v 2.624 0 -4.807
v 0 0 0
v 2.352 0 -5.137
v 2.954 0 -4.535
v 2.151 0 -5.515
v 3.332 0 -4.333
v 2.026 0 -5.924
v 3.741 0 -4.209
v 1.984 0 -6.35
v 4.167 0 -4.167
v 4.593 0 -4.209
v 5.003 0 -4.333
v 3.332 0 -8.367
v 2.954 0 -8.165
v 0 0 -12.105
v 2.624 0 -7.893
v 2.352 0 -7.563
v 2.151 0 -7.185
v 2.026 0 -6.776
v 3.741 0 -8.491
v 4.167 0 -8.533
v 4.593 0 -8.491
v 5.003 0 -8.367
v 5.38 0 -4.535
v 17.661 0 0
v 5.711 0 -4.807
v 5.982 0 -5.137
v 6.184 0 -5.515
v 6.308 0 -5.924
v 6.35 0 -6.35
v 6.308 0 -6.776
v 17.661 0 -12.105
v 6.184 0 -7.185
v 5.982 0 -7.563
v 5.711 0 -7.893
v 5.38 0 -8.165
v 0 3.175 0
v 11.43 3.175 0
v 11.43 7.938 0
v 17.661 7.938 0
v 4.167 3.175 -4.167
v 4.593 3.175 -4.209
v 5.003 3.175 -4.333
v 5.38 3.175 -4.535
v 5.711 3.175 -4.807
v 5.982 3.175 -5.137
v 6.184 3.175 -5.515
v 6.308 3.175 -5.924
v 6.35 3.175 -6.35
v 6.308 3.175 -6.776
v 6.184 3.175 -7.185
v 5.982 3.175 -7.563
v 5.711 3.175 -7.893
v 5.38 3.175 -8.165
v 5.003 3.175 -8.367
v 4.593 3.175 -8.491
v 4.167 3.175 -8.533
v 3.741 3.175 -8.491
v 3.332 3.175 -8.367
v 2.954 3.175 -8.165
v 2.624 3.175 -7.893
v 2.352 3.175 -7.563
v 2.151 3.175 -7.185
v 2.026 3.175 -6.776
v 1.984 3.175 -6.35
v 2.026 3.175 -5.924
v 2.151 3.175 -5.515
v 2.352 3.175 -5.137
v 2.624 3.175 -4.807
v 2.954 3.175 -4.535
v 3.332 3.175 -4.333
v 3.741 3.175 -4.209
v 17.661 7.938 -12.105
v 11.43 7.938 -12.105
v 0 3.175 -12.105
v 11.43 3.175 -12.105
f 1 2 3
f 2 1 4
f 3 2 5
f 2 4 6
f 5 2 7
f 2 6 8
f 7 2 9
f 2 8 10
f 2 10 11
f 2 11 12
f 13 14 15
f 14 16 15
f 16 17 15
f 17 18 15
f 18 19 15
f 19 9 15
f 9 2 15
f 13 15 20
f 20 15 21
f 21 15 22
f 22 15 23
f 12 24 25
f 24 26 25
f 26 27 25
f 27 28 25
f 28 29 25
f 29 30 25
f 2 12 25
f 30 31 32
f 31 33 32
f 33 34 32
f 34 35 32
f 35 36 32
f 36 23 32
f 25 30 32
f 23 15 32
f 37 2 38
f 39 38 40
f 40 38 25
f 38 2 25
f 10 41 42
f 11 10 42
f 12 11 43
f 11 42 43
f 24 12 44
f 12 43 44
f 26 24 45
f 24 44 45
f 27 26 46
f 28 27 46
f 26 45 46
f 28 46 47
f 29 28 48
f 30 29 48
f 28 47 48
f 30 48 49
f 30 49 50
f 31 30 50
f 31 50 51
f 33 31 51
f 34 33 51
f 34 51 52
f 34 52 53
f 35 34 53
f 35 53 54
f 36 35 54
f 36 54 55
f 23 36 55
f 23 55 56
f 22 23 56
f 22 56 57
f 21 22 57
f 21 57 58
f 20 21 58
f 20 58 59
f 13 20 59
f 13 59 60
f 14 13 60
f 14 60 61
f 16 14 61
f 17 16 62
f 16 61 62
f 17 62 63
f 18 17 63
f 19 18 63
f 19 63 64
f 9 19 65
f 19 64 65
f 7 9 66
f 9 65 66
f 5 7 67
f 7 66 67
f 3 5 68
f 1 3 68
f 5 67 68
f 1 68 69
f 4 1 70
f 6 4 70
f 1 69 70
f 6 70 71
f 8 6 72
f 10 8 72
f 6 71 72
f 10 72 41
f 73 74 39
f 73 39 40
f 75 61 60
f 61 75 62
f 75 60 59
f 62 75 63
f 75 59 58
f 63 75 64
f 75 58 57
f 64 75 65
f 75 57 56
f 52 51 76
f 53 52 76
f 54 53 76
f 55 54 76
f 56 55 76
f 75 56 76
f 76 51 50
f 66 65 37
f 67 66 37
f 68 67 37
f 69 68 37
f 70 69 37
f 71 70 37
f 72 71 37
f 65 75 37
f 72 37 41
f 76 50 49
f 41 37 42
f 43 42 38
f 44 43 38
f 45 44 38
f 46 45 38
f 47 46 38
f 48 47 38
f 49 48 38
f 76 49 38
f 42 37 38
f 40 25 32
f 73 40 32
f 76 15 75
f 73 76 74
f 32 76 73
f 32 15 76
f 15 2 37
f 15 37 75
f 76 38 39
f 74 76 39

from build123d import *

# Parameters (mm, degrees)
SKETCH1_W           = 17.6609375
SKETCH1_H           = 12.1046875
BOSS_EXTRUDE1_DEPTH = 7.9375
SKETCH2_W           = 11.43
SKETCH2_H           = 4.7625
CUT_EXTRUDE1_DEPTH  = 25.4
SKETCH3_R           = 2.1828125
CUT_EXTRUDE2_DEPTH  = 25.4


with BuildPart() as part:
    # Sketch1 → Boss-Extrude1 (new body)
    with BuildSketch(Plane(origin=(0, 0, 0), x_dir=(1, 0, 0), z_dir=(0, 1, 0))):
        with Locations((8.83046875, 6.05234375)):
            Rectangle(SKETCH1_W, SKETCH1_H)
    extrude(amount=BOSS_EXTRUDE1_DEPTH)

    # Sketch2 → Cut-Extrude1 (cut)
    with BuildSketch(Plane.XY):
        with Locations((5.715, 5.55625)):
            Rectangle(SKETCH2_W, SKETCH2_H)
    extrude(amount=-CUT_EXTRUDE1_DEPTH, mode=Mode.SUBTRACT)

    # Sketch3 → Cut-Extrude2 (cut)
    with BuildSketch(Plane(origin=(0, 3.175, 0), x_dir=(1, 0, 0), z_dir=(0, 1, 0))):
        with Locations(Location((4.1671875, 6.35, 0), (0, 0, 270))):
            Circle(SKETCH3_R)
    extrude(amount=-CUT_EXTRUDE2_DEPTH, mode=Mode.SUBTRACT)


solid = part.part
